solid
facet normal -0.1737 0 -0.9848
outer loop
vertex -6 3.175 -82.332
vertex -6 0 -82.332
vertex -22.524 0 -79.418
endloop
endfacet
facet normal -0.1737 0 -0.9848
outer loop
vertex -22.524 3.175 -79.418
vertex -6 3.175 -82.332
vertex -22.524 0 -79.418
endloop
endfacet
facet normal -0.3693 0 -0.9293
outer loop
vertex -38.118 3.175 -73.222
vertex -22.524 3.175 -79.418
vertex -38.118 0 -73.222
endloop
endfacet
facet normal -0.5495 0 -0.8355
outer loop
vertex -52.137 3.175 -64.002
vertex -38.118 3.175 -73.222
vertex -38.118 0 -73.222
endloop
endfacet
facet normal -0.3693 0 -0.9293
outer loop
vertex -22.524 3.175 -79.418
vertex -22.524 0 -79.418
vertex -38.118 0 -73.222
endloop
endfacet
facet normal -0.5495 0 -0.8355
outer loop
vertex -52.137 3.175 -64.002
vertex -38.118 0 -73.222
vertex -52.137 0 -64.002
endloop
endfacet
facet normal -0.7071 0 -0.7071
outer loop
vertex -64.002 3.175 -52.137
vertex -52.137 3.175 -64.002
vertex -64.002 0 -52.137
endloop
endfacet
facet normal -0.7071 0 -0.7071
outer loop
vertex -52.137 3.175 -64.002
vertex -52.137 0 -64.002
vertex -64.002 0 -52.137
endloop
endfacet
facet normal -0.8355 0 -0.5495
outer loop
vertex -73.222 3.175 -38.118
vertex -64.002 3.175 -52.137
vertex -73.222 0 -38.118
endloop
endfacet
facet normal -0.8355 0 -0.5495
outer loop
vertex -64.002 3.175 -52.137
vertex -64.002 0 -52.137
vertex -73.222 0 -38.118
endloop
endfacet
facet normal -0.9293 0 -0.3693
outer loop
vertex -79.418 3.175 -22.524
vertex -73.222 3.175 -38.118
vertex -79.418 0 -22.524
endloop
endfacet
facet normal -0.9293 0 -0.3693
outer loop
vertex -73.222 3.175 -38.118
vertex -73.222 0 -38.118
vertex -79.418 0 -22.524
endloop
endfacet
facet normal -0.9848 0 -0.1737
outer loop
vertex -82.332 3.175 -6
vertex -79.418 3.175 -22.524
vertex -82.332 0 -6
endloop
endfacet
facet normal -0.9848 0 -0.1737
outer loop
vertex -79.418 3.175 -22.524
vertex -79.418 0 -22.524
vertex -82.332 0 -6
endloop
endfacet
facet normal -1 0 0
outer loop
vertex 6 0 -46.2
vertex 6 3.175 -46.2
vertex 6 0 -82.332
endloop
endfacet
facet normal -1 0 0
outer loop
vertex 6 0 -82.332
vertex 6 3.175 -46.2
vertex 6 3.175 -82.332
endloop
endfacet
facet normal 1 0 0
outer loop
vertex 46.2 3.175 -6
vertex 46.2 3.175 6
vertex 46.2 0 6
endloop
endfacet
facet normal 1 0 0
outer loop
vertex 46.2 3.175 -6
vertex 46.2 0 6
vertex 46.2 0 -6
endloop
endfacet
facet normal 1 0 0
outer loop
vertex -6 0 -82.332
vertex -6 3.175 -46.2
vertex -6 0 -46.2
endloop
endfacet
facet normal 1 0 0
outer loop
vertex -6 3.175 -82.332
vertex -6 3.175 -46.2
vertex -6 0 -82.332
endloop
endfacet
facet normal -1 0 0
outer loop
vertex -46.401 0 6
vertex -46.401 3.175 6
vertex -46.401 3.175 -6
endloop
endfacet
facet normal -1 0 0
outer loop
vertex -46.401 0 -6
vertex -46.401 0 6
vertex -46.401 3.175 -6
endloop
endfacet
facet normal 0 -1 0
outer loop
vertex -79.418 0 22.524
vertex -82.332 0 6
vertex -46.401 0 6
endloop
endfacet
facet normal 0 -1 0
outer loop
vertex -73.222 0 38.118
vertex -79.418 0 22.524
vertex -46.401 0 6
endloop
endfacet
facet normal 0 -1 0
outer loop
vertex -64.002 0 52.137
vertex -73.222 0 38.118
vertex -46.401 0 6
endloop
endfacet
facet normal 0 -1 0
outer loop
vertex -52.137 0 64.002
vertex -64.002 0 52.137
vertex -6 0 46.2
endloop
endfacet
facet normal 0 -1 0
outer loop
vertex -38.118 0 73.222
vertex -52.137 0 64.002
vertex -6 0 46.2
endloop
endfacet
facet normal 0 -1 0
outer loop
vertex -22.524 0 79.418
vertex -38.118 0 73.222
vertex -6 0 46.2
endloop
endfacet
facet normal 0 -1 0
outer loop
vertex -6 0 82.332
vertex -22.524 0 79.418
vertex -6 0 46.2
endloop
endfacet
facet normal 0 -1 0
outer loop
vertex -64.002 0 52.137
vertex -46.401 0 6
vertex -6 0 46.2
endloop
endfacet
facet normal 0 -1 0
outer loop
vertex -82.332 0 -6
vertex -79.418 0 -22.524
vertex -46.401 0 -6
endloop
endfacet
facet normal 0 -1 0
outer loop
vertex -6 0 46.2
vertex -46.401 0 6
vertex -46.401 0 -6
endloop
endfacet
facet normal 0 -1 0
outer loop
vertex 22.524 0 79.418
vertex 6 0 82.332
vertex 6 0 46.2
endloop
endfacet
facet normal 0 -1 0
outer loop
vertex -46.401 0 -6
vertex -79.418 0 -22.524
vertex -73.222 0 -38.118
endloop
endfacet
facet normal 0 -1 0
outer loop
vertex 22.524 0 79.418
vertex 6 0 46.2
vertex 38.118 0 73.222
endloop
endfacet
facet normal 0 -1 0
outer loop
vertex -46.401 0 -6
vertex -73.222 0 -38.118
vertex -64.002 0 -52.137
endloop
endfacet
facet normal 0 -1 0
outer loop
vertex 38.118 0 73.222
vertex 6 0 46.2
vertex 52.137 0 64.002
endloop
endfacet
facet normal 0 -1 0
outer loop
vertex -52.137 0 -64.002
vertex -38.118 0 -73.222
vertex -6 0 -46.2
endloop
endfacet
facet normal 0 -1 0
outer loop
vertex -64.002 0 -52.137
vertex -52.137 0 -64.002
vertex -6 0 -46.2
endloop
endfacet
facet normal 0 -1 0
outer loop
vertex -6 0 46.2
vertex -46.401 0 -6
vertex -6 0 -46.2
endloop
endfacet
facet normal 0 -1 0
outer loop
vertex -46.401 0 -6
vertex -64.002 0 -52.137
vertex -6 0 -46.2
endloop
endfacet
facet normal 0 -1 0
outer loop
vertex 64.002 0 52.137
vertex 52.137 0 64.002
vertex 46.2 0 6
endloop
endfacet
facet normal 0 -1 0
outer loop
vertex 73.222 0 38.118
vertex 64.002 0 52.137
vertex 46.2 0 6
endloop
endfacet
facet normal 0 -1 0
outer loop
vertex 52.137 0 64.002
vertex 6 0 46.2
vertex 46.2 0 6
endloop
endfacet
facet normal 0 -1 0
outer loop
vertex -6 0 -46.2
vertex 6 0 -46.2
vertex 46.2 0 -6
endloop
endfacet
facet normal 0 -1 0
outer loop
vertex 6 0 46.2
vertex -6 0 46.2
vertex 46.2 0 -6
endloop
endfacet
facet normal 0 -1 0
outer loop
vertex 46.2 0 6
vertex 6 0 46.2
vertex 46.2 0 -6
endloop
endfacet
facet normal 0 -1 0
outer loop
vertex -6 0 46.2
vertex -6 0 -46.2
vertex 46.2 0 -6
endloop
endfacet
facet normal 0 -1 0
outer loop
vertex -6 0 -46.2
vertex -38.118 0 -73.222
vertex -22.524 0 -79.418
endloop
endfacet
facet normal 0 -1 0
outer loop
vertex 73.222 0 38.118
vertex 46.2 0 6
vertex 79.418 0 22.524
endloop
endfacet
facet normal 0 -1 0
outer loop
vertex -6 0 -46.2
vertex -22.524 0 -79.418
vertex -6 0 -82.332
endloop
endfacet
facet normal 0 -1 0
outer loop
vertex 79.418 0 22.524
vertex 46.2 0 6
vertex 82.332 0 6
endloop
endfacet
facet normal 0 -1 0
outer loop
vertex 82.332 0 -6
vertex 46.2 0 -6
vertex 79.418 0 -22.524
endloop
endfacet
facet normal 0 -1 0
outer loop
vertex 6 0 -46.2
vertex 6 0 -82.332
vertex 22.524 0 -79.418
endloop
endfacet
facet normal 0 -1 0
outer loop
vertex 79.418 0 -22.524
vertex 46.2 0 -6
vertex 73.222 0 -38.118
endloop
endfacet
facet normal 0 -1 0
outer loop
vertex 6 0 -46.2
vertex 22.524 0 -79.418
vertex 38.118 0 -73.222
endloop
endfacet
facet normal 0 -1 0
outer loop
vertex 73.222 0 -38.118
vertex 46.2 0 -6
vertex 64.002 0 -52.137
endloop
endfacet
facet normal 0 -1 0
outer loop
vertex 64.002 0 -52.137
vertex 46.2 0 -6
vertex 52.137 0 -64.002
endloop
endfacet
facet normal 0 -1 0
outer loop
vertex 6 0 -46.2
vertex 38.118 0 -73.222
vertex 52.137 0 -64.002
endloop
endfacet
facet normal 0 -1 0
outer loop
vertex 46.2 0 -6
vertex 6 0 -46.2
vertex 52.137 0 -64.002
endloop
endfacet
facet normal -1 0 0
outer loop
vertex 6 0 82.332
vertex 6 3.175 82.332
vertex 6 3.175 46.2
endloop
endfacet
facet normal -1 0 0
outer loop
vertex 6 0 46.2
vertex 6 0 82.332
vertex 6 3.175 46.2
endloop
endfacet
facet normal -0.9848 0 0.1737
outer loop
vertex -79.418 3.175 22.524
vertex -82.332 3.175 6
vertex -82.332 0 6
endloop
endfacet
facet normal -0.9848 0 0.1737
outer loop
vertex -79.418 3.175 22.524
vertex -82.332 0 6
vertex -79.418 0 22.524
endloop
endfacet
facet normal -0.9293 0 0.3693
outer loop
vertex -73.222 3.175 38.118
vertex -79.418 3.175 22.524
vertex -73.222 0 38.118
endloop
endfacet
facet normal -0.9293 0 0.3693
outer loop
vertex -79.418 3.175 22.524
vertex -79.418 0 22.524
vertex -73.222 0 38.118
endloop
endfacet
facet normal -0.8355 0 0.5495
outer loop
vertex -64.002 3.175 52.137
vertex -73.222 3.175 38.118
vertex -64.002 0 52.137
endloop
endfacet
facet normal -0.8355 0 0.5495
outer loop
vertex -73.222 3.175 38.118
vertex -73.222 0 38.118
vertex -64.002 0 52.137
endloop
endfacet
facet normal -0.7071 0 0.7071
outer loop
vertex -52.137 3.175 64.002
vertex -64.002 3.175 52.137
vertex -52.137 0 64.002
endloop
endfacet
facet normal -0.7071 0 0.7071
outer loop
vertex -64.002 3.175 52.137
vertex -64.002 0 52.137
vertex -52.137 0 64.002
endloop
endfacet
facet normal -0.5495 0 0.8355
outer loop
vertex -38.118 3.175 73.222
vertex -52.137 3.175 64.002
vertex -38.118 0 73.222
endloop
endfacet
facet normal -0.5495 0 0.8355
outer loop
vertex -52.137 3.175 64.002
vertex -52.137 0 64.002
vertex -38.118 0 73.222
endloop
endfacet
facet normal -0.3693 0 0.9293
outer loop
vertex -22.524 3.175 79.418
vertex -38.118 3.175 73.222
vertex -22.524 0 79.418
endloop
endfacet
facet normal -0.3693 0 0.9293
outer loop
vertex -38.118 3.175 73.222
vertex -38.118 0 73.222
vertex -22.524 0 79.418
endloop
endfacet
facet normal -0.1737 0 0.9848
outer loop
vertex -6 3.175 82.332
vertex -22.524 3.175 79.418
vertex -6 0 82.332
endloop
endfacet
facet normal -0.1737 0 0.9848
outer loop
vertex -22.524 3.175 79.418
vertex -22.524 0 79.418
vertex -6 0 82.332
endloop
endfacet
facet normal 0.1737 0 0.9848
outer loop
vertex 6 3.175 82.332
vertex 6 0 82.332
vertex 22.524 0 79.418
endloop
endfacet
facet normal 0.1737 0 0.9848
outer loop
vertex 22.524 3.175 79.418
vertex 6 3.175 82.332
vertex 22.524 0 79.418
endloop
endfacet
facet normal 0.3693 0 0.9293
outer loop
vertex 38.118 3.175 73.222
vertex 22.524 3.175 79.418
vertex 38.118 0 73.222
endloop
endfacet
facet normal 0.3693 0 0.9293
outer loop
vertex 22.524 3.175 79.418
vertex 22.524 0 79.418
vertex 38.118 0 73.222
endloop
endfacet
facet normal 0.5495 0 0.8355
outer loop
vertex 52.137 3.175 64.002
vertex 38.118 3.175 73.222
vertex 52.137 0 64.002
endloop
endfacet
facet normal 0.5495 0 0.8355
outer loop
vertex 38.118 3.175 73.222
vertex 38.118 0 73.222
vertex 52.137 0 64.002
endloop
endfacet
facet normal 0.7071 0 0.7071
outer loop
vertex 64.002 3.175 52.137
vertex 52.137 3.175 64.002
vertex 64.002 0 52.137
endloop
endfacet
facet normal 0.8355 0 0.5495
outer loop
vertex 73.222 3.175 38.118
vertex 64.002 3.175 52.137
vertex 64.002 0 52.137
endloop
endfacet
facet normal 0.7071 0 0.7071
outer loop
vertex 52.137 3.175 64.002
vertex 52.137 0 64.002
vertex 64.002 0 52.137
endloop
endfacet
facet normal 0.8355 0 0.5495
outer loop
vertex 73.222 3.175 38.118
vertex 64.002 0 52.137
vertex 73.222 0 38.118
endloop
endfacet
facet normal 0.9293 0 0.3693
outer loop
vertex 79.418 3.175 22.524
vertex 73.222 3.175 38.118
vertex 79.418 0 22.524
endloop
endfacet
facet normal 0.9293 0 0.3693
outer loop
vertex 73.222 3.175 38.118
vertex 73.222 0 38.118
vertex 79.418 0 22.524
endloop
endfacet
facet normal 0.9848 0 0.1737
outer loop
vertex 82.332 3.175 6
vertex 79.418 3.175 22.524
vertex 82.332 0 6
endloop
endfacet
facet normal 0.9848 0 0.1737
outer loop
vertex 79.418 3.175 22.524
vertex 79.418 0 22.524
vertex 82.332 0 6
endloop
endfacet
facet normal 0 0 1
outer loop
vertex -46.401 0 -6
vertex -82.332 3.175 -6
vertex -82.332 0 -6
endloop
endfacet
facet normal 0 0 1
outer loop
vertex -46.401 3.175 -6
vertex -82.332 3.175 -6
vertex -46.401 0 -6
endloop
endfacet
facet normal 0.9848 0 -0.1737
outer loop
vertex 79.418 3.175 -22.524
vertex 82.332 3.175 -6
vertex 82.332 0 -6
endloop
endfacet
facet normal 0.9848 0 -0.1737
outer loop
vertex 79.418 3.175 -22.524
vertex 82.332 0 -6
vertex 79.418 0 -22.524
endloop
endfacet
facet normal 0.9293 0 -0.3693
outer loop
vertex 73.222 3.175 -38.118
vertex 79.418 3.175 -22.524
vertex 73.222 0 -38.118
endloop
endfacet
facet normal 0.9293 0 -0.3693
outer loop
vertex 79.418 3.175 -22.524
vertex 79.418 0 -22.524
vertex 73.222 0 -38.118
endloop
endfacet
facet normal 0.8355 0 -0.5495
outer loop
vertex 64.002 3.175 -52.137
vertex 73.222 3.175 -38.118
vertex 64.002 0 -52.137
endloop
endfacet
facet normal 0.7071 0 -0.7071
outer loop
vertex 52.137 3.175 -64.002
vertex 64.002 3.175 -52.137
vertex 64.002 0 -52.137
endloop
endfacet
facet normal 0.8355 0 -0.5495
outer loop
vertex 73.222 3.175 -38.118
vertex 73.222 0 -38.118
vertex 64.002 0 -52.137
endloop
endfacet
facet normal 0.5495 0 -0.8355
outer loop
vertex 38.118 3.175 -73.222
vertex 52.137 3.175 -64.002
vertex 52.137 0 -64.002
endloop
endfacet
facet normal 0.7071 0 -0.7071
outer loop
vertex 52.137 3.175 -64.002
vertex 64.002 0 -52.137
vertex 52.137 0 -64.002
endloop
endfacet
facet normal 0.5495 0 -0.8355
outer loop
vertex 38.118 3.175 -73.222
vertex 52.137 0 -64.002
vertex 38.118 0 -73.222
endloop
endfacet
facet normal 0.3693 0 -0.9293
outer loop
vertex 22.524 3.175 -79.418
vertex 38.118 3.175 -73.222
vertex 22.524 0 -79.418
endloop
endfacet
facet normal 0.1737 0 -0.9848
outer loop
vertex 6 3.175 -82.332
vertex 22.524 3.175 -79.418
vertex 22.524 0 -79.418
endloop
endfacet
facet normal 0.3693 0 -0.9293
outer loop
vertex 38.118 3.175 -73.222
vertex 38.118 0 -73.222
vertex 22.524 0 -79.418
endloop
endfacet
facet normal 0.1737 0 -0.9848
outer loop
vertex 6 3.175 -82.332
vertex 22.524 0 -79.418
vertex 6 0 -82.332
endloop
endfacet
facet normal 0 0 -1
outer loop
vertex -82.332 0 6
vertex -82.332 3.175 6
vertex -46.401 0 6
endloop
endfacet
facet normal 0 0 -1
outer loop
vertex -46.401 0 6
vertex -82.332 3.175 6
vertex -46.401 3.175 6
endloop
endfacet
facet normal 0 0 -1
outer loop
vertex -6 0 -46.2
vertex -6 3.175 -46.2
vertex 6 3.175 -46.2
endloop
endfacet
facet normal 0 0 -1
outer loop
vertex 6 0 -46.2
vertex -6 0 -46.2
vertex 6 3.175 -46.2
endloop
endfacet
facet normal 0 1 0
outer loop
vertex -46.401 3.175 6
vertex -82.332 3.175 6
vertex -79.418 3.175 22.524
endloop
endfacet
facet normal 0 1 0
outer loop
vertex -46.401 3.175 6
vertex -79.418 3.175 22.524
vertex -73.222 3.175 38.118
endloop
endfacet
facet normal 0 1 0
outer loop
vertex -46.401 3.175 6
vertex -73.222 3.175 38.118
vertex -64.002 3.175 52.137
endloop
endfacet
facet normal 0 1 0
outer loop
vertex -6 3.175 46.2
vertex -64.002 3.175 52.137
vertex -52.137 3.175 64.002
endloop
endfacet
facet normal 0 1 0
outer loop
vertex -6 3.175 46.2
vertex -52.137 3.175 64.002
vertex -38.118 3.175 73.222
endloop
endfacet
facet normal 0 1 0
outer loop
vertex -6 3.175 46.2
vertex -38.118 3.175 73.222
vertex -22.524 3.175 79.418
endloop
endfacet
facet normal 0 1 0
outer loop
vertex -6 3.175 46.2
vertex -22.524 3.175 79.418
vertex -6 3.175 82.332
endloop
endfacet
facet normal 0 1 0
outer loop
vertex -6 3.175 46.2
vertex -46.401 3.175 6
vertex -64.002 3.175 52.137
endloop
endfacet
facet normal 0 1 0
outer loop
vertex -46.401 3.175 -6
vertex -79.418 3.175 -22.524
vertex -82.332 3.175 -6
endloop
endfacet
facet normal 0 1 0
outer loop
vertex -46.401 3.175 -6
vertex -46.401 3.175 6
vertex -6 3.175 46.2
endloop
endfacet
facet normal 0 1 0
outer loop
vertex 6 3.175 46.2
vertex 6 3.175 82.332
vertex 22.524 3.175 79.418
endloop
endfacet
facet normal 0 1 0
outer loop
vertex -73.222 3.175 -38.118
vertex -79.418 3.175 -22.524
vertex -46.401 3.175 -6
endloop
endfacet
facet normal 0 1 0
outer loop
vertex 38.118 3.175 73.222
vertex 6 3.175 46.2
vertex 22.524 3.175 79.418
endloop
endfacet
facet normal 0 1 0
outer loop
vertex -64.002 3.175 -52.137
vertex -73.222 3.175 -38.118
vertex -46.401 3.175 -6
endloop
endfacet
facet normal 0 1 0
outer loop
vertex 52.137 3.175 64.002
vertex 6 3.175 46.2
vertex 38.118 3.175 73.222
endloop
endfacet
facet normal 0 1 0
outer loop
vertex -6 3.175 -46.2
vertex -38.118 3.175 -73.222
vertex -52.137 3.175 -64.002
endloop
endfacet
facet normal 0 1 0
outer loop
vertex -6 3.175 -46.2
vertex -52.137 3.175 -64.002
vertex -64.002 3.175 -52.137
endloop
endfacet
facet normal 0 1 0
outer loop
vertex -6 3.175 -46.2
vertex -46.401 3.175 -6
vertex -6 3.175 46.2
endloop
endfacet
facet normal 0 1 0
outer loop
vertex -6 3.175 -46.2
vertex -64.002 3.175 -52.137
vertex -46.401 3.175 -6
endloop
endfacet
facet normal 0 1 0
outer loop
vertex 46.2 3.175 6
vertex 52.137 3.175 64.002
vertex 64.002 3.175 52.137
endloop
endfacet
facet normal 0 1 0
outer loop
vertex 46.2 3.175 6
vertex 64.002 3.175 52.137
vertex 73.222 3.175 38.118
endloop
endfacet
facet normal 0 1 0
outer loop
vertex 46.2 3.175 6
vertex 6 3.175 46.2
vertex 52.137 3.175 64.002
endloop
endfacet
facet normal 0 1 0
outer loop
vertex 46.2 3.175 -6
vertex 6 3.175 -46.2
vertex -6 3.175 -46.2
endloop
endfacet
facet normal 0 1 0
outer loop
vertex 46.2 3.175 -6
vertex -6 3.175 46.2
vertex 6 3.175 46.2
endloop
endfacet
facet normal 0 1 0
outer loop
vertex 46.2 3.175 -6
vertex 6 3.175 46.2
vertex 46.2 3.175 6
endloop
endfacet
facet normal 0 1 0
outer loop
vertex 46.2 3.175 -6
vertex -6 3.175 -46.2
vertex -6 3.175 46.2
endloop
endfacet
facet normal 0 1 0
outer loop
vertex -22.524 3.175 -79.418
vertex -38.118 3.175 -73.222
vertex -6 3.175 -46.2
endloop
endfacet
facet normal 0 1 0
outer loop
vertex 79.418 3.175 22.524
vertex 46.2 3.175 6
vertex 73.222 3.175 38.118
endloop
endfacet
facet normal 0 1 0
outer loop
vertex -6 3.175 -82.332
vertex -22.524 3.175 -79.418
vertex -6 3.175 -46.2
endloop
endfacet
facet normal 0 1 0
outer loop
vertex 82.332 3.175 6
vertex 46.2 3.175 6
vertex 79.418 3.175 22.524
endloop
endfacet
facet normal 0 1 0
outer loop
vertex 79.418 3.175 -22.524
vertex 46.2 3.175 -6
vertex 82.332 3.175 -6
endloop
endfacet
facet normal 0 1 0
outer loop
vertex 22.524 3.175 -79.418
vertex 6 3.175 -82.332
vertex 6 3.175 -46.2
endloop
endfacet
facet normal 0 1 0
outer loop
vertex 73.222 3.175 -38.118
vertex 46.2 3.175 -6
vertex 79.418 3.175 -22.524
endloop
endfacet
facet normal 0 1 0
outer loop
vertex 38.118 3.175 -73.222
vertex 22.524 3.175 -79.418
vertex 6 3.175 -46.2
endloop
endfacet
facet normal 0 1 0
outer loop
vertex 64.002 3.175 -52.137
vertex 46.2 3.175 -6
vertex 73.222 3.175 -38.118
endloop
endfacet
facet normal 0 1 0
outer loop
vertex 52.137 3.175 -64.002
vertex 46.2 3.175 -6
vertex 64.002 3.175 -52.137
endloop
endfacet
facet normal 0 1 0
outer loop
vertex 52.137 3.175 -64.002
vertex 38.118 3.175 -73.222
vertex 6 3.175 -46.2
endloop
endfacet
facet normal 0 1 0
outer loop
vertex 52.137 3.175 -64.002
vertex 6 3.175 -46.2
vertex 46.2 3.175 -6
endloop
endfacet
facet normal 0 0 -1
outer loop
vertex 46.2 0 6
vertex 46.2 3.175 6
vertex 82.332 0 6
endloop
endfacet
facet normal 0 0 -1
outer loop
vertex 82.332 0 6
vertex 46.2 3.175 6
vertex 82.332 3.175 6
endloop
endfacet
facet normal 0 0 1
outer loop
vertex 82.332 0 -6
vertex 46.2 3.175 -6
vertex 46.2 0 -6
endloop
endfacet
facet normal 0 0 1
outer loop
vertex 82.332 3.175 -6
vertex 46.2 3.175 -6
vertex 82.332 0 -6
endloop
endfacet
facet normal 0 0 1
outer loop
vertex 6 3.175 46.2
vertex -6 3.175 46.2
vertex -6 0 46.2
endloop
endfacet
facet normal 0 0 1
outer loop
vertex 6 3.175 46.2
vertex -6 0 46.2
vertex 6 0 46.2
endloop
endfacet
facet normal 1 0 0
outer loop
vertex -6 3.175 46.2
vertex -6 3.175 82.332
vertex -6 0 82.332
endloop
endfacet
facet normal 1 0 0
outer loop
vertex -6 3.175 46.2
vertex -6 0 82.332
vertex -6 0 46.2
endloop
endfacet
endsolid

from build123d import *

# Parameters (mm, degrees)
SKETCH1_R           = 82.55
BOSS_EXTRUDE1_DEPTH = 3.175
SKETCH2_W           = 59.59856
SKETCH2_H           = 12.0000014
SKETCH2_W_2         = 59.99988
SKETCH2_W_3         = 12.0000014
SKETCH2_H_2         = 59.99988
CUT_EXTRUDE1_DEPTH  = 3.175


with BuildPart() as part:
    # Sketch1 → Boss-Extrude1 (new body)
    with BuildSketch(Plane(origin=(0, 0, 0), x_dir=(1, 0, 0), z_dir=(0, 1, 0))):
        Circle(SKETCH1_R)
    extrude(amount=BOSS_EXTRUDE1_DEPTH)

    # Sketch2 → Cut-Extrude1 (cut)
    with BuildSketch(Plane(origin=(0, 3.175, 0), x_dir=(1, 0, 0), z_dir=(0, 1, 0))):
        with Locations((-76.2, 0)):
            Rectangle(SKETCH2_W, SKETCH2_H)
        with Locations((76.2, 0)):
            Rectangle(SKETCH2_W_2, SKETCH2_H)
        with Locations((0, 76.2)):
            Rectangle(SKETCH2_W_3, SKETCH2_H_2)
        with Locations((0, -76.2)):
            Rectangle(SKETCH2_W_3, SKETCH2_H_2)
    extrude(amount=-CUT_EXTRUDE1_DEPTH, mode=Mode.SUBTRACT)


solid = part.part
